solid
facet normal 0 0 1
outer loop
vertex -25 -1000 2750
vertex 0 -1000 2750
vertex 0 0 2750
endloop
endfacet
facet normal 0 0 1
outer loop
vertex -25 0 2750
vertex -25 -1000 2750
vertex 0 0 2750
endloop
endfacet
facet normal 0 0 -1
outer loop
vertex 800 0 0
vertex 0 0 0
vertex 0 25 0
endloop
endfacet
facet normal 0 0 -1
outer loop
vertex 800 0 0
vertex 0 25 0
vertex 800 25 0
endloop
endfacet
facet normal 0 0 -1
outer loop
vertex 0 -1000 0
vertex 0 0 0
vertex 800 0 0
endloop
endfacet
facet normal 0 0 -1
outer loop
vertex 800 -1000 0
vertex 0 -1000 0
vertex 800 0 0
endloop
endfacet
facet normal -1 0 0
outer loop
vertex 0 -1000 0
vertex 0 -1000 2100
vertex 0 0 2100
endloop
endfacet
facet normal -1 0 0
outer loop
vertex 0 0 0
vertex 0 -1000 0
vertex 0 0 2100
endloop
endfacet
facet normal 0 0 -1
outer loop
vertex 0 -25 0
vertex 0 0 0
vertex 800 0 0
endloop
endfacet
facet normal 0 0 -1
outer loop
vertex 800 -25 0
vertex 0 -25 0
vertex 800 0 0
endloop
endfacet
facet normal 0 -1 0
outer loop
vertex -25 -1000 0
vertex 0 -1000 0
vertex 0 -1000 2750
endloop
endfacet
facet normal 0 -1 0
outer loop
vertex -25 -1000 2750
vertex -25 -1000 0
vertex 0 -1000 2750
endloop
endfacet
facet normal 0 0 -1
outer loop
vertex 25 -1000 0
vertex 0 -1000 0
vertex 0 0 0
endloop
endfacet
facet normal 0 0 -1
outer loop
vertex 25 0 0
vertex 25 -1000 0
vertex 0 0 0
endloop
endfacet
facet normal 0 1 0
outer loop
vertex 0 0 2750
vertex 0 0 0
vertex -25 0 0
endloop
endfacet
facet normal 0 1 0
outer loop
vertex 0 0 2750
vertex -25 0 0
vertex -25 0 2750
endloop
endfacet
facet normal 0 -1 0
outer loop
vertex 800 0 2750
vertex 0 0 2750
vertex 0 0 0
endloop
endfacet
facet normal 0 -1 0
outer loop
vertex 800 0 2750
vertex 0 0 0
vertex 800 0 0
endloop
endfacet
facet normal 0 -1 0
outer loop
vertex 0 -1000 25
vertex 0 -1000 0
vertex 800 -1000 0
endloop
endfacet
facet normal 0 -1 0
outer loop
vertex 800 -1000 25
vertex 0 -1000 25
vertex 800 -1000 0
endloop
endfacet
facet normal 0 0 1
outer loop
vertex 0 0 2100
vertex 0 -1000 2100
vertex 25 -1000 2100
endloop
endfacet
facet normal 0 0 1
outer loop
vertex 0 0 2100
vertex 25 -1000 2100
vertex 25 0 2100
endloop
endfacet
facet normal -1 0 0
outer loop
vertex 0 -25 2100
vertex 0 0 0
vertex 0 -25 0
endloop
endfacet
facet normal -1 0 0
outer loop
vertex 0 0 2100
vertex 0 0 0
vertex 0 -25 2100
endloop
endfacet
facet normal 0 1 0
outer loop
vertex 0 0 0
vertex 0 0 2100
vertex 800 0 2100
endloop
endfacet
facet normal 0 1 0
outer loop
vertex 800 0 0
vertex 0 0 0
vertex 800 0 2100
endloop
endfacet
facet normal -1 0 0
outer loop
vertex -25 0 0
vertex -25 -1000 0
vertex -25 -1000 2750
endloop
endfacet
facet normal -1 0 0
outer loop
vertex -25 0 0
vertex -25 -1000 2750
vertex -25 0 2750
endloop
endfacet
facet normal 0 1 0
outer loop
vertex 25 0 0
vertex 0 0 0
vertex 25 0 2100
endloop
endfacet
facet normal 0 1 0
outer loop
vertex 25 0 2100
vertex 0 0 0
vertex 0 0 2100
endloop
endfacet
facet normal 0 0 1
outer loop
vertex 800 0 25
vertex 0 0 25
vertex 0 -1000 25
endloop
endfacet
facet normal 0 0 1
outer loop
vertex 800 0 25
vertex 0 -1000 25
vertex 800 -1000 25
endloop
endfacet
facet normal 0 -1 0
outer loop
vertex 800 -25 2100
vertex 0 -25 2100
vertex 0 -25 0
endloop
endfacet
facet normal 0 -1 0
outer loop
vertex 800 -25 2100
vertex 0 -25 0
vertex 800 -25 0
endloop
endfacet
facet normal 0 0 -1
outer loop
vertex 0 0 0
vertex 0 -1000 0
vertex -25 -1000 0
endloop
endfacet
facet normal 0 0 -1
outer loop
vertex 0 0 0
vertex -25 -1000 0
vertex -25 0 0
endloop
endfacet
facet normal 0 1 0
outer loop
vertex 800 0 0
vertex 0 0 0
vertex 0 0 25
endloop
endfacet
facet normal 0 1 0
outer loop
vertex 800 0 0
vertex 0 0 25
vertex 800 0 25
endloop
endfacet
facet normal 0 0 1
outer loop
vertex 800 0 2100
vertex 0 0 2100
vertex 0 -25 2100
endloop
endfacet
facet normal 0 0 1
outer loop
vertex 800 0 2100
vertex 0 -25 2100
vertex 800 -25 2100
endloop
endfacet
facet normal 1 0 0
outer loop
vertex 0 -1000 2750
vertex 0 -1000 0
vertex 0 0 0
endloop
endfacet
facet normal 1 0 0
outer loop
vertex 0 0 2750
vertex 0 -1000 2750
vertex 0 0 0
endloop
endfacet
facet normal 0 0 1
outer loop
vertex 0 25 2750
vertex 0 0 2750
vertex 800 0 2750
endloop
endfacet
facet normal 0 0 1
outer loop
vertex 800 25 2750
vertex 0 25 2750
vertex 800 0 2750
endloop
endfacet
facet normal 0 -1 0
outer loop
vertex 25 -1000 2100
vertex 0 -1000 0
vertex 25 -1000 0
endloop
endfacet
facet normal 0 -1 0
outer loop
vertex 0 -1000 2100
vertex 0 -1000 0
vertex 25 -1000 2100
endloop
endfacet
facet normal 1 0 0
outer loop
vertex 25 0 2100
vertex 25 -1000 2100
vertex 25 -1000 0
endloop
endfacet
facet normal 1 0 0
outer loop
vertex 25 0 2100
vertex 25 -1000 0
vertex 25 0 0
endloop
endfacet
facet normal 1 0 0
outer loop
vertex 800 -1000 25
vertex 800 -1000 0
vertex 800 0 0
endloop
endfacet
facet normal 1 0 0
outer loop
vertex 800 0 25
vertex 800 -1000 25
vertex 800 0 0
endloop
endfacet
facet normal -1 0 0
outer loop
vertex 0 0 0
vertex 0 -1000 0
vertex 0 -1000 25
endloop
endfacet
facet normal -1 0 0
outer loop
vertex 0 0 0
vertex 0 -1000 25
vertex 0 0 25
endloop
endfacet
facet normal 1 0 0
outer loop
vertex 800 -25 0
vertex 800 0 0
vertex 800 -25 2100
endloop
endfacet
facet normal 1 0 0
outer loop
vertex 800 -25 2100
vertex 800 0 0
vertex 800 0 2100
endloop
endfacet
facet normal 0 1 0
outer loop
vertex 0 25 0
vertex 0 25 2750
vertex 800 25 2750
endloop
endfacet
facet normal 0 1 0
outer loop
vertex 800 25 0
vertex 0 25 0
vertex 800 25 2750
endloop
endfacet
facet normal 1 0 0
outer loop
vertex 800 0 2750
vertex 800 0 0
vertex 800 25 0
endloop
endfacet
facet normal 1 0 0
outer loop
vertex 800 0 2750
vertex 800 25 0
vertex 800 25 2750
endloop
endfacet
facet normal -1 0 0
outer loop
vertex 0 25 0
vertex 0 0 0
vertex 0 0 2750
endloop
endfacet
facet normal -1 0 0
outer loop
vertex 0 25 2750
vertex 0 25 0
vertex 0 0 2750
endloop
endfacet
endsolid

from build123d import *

# Parameters (mm, degrees)
F0_W     = 800
F0_H     = 2750
F1_DEPTH = 25
F2_W     = 1000
F2_H     = 2750
F3_DEPTH = 25
F4_W     = 800
F4_H     = 1000
F5_DEPTH = 25
F6_W     = 800
F6_H     = 2100
F7_DEPTH = 25
F8_W     = 1000
F8_H     = 2100
F9_DEPTH = 25


with BuildPart() as f1:
    # F0 (on Front) → F1 (new body)
    with BuildSketch(Plane.XZ):
        with Locations((400, 1375)):
            Rectangle(F0_W, F0_H)
    extrude(amount=-F1_DEPTH)

    # F2 (on Right) → F3 (join)
    with BuildSketch(Plane.YZ):
        with Locations((-500, 1375)):
            Rectangle(F2_W, F2_H)
    extrude(amount=-F3_DEPTH)


with BuildPart() as f5:
    # F4 (on Top) → F5 (new body)
    with BuildSketch(Plane.XY):
        with Locations((400, -500)):
            Rectangle(F4_W, F4_H)
    extrude(amount=F5_DEPTH)


with BuildPart() as f7:
    # F6 (on face) → F7 (new body)
    with BuildSketch(Plane.XZ):
        with Locations((400, 1050)):
            Rectangle(F6_W, F6_H)
    extrude(amount=F7_DEPTH)


with BuildPart() as f9:
    # F8 (on face) → F9 (new body)
    with BuildSketch(Plane.YZ):
        with Locations((-500, 1050)):
            Rectangle(F8_W, F8_H)
    extrude(amount=F9_DEPTH)


solid = Compound([f1.part, f5.part, f7.part, f9.part])
